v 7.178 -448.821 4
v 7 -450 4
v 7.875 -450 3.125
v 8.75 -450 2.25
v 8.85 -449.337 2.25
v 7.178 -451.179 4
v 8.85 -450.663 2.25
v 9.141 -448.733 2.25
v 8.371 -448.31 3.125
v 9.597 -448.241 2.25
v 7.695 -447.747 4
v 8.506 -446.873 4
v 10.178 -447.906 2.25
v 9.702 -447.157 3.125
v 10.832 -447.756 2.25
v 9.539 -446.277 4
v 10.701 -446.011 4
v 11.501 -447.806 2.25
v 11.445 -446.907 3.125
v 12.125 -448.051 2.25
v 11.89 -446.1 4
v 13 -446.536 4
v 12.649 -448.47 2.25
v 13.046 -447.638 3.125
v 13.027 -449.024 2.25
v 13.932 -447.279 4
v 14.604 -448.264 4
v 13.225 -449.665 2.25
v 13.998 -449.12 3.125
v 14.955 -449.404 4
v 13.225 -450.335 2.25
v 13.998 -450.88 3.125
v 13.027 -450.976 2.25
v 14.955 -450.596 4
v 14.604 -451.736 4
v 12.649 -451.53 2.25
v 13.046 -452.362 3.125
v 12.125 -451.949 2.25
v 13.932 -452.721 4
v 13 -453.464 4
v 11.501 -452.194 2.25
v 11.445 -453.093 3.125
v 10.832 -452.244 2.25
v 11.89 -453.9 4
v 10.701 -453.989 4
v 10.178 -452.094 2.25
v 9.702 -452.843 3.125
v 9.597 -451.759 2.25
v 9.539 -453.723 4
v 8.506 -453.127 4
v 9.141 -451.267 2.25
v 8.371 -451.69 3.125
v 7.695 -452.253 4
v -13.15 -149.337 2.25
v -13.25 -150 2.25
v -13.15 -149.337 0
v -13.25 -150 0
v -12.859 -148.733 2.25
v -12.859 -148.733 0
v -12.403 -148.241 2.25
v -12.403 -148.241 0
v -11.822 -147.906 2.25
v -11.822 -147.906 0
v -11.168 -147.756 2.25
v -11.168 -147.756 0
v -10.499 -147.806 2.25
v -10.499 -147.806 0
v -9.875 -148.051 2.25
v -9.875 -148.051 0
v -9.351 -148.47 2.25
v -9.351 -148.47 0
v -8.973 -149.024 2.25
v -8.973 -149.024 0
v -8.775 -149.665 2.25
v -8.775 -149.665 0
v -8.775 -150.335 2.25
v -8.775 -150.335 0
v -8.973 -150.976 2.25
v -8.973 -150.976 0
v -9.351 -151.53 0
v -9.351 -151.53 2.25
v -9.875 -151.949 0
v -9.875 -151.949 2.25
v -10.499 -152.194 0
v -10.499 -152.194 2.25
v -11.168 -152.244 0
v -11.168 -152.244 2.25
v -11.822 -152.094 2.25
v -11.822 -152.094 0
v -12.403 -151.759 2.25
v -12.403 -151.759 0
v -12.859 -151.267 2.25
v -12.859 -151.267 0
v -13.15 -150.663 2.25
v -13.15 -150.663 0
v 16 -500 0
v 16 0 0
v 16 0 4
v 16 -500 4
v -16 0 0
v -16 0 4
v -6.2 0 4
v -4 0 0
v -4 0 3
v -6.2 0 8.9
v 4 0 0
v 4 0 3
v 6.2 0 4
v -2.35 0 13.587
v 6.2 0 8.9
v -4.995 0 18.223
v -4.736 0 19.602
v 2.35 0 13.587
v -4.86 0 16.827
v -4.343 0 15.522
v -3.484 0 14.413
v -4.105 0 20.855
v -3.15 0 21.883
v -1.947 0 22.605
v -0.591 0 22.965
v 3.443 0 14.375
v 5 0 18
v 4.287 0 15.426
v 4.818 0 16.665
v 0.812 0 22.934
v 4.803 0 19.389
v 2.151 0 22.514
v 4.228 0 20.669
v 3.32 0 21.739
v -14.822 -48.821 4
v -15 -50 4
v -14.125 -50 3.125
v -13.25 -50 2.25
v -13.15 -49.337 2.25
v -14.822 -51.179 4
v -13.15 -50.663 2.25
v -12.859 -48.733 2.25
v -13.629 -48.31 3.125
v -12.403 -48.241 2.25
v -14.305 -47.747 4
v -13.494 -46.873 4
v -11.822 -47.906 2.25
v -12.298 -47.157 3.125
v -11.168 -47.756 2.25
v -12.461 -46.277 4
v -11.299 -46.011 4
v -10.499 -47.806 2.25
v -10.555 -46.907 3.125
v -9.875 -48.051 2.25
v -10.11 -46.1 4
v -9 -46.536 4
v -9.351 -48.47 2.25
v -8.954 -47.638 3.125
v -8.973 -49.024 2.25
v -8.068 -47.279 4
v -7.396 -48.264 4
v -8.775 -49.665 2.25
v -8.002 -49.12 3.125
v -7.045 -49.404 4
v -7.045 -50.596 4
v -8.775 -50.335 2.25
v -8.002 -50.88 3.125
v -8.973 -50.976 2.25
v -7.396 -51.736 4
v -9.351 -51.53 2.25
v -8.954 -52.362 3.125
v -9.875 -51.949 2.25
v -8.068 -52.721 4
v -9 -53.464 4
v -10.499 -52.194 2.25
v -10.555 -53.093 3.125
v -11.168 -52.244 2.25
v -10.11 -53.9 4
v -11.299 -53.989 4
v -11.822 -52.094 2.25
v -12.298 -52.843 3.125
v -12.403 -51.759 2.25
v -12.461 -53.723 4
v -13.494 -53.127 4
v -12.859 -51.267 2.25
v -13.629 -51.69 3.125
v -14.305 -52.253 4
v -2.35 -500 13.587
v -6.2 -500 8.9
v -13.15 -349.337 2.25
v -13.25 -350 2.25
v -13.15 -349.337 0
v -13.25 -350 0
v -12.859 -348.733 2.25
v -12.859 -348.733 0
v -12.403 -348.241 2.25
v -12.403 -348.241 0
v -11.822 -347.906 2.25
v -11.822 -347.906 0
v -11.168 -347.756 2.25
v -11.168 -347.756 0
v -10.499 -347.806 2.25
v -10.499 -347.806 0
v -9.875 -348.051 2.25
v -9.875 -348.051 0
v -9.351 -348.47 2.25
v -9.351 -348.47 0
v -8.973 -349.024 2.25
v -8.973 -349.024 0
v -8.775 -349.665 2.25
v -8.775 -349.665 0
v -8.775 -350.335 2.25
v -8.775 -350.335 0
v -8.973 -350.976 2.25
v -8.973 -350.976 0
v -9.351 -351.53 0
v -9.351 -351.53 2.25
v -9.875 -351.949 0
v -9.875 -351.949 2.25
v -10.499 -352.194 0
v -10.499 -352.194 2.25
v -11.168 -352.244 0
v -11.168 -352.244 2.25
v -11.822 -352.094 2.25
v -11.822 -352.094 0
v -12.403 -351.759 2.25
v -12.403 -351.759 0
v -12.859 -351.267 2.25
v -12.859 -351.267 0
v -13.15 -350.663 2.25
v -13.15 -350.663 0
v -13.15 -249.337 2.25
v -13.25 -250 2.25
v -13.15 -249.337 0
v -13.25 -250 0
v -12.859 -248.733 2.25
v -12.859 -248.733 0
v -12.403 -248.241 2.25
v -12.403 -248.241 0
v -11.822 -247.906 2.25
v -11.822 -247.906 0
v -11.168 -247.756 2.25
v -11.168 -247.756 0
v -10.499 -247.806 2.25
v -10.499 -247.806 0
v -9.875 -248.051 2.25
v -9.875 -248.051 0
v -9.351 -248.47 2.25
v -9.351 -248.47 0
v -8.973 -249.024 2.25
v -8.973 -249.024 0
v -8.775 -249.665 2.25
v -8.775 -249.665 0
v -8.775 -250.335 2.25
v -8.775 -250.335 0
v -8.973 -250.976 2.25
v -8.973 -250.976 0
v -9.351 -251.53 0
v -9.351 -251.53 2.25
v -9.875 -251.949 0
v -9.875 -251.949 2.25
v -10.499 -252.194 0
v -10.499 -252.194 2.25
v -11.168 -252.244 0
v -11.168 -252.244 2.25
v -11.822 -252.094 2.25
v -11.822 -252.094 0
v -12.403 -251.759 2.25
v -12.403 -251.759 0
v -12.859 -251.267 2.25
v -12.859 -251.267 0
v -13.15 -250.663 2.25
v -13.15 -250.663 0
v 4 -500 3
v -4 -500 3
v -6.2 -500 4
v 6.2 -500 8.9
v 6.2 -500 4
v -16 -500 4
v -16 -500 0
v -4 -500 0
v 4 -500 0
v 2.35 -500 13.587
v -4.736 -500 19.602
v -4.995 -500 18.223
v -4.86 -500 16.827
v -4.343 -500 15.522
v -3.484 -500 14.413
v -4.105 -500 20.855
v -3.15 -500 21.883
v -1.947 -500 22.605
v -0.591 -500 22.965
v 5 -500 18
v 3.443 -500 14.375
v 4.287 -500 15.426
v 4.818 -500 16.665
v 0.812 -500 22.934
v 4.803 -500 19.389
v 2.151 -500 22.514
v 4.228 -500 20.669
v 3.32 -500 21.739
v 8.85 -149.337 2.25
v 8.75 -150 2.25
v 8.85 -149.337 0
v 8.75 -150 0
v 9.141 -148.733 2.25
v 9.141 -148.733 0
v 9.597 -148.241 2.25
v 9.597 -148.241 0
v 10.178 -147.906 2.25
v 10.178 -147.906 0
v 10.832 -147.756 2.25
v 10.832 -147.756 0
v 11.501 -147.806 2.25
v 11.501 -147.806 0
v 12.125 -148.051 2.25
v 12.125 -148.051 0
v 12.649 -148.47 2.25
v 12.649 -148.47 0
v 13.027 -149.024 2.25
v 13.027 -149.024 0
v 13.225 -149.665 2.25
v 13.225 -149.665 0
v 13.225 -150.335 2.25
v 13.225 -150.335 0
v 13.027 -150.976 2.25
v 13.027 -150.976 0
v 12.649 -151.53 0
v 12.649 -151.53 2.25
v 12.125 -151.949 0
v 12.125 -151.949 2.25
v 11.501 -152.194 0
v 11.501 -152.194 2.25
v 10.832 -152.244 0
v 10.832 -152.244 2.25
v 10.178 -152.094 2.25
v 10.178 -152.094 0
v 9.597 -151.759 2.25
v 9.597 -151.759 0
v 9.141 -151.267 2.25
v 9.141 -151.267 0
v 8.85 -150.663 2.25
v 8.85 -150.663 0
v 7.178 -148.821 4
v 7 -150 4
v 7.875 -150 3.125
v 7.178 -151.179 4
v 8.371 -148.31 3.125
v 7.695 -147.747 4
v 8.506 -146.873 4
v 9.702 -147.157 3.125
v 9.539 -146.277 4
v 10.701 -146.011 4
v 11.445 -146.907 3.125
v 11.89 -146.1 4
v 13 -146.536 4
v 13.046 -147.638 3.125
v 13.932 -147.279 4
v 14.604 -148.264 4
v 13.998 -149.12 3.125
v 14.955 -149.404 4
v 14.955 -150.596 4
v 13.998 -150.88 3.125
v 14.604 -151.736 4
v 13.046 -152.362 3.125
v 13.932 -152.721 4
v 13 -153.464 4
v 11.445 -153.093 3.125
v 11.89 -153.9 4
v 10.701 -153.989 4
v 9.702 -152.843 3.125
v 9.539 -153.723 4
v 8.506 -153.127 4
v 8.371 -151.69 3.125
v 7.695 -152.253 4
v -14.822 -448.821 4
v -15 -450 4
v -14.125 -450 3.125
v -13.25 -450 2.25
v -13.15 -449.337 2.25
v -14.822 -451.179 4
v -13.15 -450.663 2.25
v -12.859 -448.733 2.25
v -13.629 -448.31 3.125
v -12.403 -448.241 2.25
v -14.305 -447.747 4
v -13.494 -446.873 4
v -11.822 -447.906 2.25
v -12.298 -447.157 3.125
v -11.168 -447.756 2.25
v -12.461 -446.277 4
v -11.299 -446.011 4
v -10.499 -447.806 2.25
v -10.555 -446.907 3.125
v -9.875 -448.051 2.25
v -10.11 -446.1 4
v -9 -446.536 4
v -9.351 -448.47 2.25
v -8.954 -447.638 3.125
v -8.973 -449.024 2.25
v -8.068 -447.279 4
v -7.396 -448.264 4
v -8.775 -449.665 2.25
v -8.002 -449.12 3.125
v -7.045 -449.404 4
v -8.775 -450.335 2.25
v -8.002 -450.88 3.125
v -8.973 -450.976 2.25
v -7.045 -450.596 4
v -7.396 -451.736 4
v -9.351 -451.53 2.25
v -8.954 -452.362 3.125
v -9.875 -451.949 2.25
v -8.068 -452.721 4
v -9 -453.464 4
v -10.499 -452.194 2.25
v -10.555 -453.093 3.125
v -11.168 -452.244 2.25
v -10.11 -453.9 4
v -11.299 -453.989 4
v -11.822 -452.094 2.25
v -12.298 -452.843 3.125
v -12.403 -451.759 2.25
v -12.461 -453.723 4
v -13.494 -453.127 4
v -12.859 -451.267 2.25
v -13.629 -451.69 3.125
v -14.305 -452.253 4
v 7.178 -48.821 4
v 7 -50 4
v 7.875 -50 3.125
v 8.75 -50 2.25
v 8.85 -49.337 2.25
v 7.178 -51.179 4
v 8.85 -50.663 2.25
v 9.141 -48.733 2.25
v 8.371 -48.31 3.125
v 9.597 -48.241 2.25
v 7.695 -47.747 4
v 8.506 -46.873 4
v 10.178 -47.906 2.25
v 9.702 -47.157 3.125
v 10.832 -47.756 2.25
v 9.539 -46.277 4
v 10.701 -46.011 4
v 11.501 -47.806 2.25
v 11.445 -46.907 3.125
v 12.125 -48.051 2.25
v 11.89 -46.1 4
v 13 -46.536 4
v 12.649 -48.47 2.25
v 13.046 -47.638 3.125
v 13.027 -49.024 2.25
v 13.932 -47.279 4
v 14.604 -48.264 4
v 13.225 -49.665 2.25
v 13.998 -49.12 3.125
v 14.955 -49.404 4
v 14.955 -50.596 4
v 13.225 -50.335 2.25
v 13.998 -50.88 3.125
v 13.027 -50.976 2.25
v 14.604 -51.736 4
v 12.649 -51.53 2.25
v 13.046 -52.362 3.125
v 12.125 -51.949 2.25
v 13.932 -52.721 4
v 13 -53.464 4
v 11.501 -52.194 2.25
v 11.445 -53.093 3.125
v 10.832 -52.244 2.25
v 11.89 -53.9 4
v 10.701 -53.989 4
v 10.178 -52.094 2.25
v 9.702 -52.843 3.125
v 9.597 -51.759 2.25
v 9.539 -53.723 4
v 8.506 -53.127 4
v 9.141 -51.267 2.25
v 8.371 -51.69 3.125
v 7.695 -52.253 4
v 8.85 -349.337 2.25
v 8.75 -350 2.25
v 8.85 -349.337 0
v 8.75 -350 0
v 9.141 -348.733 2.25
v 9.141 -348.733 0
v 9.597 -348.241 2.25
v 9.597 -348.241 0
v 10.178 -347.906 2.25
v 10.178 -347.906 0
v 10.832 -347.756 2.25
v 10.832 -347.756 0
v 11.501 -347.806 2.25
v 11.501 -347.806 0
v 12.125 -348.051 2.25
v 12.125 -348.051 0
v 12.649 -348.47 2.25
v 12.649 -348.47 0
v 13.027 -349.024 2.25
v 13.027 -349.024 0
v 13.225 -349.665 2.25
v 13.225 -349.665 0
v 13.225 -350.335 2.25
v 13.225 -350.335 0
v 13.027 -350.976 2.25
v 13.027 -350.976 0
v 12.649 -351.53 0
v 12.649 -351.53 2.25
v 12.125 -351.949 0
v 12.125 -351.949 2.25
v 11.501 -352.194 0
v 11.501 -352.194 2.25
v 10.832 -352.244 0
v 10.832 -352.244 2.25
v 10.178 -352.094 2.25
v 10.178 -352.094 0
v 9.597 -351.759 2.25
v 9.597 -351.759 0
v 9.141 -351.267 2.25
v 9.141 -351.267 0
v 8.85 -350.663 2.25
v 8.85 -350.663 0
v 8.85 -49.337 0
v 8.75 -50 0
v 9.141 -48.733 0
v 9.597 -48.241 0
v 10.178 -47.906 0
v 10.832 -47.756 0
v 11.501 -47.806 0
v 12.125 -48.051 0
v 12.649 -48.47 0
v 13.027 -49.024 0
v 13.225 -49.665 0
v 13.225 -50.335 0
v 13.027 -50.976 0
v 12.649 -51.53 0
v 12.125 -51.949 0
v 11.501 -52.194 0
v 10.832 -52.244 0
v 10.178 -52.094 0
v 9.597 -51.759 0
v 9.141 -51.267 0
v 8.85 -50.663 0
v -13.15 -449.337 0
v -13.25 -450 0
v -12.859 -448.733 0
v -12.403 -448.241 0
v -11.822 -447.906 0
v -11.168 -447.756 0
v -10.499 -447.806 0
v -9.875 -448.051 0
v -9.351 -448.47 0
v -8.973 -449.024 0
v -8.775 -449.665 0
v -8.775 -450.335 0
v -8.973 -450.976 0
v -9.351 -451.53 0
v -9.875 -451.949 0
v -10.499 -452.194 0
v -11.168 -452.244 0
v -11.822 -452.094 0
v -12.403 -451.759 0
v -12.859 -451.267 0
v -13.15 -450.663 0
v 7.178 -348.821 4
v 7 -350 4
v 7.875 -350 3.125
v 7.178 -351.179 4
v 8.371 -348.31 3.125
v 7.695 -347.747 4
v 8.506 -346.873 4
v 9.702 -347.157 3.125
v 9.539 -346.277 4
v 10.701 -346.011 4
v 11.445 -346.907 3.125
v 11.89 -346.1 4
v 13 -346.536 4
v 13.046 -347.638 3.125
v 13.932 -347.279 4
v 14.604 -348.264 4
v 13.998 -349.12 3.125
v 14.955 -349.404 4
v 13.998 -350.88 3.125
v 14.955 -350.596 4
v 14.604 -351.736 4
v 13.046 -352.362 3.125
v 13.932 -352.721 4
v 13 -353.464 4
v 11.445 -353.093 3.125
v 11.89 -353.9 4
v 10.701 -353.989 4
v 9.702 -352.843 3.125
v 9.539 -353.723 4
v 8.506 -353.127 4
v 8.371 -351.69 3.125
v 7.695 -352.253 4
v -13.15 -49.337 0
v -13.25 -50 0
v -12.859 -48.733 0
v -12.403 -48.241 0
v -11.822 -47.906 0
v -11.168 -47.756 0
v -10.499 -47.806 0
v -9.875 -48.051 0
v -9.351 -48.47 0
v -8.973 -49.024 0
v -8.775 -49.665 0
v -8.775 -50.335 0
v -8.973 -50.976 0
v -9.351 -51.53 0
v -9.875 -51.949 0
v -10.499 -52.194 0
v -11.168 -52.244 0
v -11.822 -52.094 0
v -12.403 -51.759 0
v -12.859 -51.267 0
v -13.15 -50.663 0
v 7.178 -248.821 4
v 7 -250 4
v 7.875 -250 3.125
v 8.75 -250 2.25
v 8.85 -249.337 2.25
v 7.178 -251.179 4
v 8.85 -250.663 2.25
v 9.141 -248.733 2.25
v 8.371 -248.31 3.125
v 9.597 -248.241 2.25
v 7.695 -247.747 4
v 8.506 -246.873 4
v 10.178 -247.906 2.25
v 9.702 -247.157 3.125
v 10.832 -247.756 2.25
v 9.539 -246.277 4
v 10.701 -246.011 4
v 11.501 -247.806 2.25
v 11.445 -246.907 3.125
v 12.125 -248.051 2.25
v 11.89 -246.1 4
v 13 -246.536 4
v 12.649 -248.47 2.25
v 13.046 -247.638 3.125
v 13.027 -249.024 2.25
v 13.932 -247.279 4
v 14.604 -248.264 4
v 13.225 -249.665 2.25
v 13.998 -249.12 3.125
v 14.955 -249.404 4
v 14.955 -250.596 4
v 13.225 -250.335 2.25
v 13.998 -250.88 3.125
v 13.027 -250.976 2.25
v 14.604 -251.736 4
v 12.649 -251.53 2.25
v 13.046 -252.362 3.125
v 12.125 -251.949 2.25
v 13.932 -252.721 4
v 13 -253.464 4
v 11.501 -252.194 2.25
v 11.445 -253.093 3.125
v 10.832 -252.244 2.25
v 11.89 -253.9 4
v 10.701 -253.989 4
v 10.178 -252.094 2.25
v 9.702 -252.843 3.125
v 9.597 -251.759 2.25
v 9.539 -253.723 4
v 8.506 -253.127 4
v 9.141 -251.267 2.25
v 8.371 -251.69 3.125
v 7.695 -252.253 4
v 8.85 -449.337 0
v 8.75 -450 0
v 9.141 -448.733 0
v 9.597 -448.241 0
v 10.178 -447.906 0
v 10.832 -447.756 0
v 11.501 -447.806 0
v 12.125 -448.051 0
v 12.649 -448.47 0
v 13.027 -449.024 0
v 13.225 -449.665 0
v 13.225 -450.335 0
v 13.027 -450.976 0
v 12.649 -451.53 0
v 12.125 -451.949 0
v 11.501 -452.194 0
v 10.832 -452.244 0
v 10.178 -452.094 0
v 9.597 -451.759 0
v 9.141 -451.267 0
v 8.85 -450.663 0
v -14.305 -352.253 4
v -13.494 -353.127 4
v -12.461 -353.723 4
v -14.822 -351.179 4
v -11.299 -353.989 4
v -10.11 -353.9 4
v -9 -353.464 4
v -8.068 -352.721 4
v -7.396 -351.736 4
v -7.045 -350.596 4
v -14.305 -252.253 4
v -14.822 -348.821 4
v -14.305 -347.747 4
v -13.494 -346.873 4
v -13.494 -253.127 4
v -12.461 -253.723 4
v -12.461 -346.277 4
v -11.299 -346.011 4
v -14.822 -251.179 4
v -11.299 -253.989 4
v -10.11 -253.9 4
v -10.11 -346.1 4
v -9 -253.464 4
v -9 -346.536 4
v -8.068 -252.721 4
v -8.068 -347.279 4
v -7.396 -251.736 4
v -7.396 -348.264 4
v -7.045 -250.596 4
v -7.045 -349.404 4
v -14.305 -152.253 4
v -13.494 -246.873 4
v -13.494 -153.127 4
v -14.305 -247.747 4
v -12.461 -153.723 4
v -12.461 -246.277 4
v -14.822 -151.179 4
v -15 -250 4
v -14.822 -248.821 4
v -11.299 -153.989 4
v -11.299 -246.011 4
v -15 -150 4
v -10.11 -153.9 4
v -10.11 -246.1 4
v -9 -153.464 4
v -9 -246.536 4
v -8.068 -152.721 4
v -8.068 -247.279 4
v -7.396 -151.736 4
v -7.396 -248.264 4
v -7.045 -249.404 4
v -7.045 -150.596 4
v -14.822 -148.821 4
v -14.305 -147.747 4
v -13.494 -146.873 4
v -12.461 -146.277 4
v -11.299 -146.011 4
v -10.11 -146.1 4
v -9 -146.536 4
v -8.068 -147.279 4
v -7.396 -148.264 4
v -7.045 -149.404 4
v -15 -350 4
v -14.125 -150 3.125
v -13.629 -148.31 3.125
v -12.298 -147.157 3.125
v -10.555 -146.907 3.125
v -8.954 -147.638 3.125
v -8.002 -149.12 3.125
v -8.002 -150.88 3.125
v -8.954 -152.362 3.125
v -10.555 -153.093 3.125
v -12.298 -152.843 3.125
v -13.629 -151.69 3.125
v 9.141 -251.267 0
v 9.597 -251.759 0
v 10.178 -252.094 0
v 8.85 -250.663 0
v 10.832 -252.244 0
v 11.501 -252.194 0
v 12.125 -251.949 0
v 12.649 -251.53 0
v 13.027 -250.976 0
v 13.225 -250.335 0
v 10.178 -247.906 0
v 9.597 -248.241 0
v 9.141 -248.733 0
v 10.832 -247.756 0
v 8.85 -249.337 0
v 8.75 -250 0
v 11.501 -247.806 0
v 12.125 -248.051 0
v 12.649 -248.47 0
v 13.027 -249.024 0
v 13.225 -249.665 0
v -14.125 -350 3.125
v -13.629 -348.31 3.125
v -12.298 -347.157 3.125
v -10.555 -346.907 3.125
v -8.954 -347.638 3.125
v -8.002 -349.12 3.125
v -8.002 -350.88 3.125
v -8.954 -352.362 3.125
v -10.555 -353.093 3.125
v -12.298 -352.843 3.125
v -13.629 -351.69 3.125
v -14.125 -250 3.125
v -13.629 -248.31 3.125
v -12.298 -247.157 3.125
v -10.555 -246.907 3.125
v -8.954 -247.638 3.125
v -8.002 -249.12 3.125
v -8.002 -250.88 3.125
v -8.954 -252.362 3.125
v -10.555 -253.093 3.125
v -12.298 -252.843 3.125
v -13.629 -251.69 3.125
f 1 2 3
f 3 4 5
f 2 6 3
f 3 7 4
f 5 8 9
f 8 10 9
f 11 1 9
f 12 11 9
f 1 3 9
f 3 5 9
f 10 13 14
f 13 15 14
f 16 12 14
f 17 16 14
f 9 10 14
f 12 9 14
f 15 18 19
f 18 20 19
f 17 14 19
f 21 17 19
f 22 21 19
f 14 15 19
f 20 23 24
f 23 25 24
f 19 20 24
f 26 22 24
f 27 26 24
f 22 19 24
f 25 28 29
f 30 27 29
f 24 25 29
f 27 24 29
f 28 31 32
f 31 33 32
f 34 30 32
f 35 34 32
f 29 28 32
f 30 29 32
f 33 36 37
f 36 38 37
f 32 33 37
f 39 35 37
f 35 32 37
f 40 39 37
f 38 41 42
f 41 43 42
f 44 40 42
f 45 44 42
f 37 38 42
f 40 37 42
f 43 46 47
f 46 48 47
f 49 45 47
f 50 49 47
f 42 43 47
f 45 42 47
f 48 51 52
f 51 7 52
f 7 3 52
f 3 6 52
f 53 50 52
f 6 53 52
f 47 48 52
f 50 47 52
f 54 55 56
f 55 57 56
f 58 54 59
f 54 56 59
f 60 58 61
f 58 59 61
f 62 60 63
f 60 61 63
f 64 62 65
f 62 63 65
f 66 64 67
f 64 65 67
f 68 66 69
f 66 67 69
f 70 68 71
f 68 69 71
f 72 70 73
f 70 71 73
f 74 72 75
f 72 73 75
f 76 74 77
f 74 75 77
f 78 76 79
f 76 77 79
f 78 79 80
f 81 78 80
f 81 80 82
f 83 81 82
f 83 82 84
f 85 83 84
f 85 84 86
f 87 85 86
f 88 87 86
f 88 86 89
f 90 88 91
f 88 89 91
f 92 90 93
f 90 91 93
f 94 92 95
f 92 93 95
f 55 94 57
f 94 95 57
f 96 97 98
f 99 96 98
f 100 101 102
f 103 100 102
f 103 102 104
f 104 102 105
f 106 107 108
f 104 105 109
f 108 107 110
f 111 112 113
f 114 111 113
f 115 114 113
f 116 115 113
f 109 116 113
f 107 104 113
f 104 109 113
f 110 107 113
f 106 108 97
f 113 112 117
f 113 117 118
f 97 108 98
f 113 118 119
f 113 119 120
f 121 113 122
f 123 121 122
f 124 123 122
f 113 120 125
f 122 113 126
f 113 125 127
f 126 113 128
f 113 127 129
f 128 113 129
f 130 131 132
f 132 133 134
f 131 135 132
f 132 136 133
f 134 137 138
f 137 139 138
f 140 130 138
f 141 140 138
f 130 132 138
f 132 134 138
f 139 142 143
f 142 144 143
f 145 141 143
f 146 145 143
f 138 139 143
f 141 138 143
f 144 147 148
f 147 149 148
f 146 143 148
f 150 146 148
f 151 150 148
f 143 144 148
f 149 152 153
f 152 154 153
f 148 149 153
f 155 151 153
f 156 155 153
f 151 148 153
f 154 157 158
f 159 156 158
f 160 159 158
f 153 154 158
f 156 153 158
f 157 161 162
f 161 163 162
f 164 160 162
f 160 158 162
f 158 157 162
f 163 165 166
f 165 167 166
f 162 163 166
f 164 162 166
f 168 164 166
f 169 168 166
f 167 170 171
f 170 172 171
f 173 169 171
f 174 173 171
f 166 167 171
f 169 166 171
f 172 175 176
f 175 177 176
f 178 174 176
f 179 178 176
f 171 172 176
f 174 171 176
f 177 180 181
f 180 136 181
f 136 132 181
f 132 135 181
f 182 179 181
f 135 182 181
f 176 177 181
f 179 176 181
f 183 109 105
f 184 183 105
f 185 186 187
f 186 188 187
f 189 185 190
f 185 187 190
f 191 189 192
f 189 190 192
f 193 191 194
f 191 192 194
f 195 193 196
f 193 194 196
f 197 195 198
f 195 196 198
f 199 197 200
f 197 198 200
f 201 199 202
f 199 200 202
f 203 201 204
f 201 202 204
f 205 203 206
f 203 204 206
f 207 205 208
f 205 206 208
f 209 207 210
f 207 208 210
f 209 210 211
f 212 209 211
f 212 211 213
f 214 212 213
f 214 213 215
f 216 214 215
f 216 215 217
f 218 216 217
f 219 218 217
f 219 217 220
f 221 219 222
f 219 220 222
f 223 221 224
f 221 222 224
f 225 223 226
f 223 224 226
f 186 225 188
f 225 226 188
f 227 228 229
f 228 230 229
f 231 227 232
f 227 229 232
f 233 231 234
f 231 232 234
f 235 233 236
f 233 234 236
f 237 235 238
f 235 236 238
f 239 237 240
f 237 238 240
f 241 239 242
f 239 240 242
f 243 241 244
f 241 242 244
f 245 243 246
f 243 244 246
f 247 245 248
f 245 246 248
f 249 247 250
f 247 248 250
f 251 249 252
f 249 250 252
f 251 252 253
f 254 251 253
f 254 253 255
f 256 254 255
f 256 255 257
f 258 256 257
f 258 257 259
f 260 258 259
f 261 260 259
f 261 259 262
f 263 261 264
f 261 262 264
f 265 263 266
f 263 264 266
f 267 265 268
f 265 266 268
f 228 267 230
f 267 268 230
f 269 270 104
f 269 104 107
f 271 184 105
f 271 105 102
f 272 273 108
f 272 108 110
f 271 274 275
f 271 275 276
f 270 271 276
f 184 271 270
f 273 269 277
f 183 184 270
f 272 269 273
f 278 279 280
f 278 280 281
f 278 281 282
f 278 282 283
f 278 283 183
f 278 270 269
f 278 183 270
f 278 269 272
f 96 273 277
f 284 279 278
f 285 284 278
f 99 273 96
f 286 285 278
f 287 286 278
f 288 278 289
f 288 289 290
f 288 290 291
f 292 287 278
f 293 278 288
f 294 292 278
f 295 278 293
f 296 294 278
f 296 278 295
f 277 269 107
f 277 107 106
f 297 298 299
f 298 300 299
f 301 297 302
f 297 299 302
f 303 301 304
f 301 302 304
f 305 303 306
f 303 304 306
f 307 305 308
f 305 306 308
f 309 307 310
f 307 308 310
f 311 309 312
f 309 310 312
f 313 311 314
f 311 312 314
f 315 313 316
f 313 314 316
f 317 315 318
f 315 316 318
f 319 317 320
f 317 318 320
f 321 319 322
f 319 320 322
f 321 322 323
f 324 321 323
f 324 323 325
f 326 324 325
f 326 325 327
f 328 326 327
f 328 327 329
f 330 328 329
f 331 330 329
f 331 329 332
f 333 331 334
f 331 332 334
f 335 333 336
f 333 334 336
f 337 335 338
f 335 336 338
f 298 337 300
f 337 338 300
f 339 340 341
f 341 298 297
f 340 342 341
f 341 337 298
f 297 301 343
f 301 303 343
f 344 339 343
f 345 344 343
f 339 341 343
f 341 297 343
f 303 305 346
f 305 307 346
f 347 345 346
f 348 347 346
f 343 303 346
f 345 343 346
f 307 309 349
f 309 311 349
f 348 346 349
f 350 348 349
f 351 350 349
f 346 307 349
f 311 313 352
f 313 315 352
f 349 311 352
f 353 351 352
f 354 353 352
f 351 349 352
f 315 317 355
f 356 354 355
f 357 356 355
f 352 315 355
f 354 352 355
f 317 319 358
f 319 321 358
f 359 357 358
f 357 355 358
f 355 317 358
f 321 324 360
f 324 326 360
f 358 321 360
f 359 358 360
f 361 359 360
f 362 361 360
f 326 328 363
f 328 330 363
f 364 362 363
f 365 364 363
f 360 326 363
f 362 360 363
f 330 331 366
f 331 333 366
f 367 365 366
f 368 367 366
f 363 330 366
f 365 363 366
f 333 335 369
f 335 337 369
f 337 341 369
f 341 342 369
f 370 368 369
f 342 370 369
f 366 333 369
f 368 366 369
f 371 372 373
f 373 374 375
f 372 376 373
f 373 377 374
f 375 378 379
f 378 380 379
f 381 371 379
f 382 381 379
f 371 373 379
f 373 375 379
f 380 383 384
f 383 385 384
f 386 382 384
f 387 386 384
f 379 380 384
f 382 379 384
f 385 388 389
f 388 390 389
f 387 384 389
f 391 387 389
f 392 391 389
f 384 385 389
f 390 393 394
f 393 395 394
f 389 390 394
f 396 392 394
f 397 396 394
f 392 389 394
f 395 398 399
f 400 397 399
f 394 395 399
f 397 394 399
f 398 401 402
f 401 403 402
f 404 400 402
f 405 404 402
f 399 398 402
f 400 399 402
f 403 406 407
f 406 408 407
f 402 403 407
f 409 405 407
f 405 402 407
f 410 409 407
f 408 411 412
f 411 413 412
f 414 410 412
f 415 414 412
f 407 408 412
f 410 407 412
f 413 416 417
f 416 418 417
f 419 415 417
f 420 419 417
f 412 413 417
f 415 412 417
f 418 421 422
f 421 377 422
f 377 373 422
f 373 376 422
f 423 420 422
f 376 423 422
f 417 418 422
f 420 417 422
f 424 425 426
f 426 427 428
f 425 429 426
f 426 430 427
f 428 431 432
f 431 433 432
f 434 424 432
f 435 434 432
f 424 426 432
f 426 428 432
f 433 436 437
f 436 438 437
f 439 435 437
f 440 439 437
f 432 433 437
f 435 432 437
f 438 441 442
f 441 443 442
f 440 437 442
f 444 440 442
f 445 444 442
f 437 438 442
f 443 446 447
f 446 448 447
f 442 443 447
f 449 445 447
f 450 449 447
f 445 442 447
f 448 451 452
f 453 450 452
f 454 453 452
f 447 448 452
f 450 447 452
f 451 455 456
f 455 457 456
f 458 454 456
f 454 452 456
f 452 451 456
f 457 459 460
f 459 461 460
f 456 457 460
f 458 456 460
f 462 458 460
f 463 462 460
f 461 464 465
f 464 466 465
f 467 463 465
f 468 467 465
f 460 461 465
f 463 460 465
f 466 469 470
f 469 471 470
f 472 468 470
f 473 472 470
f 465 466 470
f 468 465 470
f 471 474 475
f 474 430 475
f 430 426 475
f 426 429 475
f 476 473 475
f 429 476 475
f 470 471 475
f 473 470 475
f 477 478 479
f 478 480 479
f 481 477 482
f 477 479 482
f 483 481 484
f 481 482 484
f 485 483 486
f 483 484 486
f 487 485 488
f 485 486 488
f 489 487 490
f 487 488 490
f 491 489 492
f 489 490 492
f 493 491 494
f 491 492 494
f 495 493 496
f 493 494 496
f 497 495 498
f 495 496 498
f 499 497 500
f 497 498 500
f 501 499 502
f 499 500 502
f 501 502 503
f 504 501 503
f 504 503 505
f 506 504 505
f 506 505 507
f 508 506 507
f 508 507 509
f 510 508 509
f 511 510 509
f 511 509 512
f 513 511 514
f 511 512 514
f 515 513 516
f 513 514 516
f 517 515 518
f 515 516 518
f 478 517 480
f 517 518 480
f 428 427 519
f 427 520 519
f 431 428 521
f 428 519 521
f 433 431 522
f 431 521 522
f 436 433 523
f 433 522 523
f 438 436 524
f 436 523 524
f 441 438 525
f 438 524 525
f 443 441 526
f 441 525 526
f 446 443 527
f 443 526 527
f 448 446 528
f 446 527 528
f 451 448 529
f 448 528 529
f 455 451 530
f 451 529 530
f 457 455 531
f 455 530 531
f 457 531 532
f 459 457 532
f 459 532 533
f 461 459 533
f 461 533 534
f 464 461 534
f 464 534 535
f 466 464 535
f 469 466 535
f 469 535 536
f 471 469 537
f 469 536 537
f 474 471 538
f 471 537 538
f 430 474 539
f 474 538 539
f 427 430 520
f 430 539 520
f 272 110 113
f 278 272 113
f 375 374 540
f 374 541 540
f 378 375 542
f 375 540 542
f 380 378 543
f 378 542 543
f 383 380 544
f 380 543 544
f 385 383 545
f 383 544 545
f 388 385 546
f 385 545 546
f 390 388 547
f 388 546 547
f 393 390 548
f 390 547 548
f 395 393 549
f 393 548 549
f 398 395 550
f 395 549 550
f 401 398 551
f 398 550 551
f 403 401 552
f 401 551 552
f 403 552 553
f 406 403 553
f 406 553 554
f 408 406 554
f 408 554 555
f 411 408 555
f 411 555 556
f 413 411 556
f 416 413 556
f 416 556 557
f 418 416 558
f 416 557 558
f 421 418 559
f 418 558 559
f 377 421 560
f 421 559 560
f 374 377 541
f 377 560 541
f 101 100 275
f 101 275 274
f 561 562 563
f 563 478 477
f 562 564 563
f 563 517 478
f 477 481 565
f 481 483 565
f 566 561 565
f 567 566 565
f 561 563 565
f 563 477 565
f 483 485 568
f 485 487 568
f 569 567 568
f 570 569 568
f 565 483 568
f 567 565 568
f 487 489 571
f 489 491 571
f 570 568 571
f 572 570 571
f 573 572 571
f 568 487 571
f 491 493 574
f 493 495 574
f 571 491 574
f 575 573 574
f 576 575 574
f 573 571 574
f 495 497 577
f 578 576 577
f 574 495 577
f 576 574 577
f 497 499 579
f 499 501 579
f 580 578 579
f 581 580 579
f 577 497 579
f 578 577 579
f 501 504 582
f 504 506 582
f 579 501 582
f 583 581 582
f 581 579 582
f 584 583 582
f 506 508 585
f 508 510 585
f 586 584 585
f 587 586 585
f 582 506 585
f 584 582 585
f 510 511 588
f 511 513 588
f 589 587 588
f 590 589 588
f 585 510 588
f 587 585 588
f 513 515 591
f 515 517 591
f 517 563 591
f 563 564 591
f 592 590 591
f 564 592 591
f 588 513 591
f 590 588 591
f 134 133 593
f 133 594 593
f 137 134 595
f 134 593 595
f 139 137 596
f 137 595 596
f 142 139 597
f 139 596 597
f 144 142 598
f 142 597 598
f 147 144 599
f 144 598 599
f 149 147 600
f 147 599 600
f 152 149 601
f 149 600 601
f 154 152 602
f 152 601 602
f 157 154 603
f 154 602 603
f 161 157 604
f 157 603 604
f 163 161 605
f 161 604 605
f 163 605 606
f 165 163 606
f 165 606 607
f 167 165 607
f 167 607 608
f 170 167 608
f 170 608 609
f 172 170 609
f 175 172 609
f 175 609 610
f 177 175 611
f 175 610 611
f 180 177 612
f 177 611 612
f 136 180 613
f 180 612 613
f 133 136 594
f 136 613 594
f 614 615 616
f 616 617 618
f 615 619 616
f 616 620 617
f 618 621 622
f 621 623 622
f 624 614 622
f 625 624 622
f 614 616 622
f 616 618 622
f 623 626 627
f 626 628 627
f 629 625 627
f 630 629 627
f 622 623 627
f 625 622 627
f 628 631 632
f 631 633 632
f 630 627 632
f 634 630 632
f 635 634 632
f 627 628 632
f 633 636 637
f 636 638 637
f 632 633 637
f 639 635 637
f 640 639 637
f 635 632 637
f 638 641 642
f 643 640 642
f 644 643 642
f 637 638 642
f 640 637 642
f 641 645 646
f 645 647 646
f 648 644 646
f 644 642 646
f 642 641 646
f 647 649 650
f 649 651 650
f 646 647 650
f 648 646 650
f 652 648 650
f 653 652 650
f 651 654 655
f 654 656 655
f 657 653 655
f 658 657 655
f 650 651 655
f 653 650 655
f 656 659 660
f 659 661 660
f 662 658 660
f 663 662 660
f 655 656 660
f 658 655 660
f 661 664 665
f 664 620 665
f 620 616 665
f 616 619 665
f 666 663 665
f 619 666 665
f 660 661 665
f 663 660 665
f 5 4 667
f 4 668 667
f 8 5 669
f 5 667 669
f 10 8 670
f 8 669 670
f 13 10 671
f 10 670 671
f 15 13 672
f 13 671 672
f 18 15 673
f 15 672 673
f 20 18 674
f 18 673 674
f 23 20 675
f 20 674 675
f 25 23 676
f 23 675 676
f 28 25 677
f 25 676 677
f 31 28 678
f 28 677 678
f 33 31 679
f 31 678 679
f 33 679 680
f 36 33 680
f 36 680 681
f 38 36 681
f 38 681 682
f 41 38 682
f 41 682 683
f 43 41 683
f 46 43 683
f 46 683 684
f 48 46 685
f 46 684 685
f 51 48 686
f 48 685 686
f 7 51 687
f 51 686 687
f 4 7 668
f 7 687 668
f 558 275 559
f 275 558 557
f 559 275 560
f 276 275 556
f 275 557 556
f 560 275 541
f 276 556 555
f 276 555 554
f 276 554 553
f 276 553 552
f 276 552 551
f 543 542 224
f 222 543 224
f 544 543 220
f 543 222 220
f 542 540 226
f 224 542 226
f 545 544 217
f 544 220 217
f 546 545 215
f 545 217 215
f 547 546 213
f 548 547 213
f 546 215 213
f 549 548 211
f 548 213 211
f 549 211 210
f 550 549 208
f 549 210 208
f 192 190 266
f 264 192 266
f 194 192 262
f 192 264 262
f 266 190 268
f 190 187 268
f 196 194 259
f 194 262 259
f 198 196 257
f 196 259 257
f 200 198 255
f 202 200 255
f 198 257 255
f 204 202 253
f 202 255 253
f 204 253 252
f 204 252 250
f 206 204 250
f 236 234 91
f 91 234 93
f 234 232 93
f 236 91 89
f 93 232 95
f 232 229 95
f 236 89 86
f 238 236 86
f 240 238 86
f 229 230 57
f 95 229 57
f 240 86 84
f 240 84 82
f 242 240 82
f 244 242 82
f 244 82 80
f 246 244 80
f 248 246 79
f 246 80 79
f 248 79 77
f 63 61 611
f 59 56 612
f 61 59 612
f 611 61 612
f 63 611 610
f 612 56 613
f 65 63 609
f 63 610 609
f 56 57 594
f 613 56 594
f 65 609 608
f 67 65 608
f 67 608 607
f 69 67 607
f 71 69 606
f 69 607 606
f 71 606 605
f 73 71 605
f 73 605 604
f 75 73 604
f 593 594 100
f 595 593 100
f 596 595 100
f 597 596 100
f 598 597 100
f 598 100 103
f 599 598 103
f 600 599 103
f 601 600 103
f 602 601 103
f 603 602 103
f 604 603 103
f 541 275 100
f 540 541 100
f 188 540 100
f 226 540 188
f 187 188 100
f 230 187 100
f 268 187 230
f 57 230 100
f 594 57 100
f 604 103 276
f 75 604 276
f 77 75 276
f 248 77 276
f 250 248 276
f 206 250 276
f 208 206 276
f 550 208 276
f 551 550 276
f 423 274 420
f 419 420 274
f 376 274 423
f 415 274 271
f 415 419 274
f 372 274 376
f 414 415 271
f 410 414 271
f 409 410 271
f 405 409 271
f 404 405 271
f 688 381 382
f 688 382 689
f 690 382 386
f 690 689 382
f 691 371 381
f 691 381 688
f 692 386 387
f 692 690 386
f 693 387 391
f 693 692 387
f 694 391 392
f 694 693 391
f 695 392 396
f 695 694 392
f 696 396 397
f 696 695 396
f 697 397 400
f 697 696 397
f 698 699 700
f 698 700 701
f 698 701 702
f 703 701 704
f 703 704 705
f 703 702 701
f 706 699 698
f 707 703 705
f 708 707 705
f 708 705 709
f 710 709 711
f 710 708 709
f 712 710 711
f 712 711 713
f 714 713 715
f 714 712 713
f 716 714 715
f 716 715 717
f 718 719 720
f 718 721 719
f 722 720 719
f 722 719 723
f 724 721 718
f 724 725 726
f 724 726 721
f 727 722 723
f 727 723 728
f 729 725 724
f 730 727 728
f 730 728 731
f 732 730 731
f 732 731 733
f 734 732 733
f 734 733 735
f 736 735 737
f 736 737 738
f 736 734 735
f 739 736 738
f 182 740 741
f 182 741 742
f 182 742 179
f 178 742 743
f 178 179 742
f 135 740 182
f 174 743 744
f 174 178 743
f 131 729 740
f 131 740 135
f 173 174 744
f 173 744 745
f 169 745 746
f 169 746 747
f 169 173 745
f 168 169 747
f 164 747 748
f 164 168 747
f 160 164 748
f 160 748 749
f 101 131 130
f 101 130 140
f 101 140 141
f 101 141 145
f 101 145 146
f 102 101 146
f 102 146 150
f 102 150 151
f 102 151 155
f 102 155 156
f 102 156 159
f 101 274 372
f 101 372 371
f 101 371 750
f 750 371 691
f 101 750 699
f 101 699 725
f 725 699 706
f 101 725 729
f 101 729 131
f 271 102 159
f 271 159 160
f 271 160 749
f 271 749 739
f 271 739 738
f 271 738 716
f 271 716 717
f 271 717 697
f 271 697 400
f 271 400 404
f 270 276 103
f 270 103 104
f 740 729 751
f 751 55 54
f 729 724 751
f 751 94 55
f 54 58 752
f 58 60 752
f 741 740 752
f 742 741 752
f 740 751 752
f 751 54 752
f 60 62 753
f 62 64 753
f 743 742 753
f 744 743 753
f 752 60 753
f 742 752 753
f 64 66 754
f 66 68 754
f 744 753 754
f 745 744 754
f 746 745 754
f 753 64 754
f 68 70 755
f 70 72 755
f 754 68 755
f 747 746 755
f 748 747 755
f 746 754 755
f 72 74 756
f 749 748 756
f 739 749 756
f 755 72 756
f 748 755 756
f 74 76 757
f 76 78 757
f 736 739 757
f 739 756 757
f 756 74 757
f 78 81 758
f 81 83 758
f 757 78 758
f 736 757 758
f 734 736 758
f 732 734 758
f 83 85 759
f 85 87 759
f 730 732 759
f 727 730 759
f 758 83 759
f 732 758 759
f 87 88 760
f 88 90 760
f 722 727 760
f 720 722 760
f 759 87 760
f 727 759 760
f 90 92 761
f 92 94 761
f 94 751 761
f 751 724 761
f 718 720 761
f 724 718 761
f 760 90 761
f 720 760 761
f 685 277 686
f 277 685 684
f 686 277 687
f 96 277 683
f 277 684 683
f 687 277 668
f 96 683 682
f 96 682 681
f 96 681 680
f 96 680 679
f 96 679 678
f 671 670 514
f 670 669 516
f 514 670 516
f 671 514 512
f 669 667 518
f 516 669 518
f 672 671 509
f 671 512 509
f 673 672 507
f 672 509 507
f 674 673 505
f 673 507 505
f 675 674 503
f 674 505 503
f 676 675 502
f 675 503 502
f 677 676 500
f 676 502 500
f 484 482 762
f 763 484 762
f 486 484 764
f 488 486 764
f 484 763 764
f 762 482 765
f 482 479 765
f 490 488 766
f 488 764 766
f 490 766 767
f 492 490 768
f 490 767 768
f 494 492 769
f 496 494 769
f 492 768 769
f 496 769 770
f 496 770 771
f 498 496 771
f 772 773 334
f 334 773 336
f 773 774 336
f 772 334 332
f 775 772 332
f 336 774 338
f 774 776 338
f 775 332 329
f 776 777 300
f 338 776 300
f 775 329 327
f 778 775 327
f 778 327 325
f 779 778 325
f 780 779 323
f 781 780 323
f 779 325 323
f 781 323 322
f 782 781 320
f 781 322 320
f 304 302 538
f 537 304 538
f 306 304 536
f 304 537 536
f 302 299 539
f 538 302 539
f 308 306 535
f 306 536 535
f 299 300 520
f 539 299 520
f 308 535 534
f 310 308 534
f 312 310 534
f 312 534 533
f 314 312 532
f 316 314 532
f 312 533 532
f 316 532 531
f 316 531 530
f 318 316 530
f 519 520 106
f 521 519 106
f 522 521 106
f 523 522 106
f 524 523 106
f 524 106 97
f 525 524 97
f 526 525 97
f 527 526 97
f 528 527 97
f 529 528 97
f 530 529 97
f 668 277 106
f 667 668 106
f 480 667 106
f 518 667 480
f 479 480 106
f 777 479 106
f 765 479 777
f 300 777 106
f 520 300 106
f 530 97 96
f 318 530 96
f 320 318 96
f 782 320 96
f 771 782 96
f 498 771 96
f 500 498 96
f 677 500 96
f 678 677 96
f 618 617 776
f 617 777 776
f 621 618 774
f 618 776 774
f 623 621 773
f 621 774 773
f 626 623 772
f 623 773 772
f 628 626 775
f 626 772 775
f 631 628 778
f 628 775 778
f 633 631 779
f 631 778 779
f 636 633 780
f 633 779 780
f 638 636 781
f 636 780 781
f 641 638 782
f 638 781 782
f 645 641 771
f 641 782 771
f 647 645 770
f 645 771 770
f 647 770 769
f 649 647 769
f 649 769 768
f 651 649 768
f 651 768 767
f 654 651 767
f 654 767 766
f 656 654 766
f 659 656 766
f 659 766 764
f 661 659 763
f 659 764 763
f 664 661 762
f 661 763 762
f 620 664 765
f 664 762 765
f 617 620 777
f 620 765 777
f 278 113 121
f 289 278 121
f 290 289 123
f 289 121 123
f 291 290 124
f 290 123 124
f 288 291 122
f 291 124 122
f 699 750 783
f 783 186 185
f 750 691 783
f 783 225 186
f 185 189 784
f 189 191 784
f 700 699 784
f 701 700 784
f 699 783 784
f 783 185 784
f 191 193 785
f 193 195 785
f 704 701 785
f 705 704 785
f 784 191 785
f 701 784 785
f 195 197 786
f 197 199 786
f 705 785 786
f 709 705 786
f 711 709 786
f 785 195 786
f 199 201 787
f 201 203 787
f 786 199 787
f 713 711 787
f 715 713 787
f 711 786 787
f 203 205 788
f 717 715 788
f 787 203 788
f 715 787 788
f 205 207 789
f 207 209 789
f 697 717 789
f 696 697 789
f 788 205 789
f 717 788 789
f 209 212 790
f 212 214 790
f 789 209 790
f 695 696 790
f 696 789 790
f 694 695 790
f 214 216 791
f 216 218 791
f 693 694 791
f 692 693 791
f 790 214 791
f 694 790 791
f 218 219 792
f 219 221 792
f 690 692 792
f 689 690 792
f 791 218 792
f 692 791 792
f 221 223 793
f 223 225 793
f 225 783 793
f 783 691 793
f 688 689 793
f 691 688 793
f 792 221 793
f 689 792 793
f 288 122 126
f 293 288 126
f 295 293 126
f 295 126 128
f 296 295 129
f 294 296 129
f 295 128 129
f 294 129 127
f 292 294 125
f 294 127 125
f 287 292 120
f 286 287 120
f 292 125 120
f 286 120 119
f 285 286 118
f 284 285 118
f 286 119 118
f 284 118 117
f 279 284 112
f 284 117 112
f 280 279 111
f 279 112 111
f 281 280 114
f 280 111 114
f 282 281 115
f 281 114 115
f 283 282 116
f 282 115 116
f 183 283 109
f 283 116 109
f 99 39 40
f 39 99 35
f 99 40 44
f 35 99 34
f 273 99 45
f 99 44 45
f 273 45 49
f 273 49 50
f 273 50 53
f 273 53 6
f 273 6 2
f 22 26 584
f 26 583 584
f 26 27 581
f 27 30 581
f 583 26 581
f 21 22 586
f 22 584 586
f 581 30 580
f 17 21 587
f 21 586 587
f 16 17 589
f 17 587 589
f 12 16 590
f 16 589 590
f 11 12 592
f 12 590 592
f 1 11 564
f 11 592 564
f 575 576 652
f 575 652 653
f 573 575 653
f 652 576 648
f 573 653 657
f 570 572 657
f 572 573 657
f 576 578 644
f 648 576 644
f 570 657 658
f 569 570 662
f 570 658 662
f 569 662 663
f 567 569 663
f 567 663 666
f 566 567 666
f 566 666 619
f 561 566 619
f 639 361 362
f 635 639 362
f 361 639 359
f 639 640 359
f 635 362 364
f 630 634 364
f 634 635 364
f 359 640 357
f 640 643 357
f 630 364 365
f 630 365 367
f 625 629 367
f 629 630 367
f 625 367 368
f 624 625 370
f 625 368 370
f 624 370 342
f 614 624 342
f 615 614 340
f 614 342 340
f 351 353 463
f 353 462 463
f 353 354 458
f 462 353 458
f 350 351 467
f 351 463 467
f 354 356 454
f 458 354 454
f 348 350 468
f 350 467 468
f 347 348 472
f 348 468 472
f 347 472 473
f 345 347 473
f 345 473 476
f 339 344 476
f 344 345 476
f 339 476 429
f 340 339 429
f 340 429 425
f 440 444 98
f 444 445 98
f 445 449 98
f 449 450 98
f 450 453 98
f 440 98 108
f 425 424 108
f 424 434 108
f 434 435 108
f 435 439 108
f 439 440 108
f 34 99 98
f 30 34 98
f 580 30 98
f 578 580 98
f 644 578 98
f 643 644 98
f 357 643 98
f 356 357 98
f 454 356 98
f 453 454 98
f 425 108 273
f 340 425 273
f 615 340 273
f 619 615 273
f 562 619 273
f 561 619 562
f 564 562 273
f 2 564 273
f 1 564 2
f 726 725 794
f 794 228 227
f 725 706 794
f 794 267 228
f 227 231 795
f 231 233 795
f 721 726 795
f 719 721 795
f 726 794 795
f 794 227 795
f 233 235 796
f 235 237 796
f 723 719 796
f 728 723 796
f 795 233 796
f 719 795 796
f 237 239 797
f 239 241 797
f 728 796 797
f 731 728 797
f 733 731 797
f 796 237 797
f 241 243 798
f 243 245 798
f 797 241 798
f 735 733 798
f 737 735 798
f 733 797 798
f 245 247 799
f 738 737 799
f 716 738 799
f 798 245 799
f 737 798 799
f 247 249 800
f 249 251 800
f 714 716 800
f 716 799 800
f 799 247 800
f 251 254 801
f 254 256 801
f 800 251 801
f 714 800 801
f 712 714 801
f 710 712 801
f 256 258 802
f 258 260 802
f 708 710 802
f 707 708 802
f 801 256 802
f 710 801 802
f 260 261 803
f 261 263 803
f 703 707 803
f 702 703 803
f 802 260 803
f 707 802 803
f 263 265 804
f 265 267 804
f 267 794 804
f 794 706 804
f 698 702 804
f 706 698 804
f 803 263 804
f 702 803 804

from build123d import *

# Parameters (mm, degrees)
F1_W           = 9.8
F1_H           = 4
F1_W_2         = 12.4
F1_H_2         = 4.9
F3_DEPTH       = 500
F5_D           = 4.5
F5_CSINK_D     = 8
F5_CSINK_ANGLE = 90


with BuildPart() as f3:
    # F1 (on Front) → F3 (new body, through all)
    with BuildSketch(Plane.XZ):
        with Locations((11.1, 2)):
            Rectangle(F1_W, F1_H)
        Polygon((-6.2, 4), (-6.2, 0), (-4, 0), (-4, 3), (4, 3), (4, 0), (6.2, 0), (6.2, 4), align=None)
        with Locations((0, 6.45)):
            Rectangle(F1_W_2, F1_H_2)
        with BuildLine():
            ThreePointArc((5, 18), (-2.5739075352, 22.2866070499), (-2.35, 13.5866679255))
            ThreePointArc((-2.35, 13.5866679255), (0, 13), (2.35, 13.5866679255))
            ThreePointArc((2.35, 13.5866679255), (4.2866070499, 15.4260924648), (5, 18))
        make_face()
        with Locations((-11.1, 2)):
            Rectangle(F1_W, F1_H)
        with BuildLine():
            Line((-2.35, 13.5866679255), (-6.2, 8.9))
            Line((-6.2, 8.9), (6.2, 8.9))
            Line((6.2, 8.9), (2.35, 13.5866679255))
            ThreePointArc((2.35, 13.5866679255), (0, 13), (-2.35, 13.5866679255))
        make_face()
    extrude(amount=F3_DEPTH)

    # F5 (through all)
    with Locations(Plane.XY.offset(4)):
        with Locations((11, -50), (-11, -50), (-11, -150), (11, -150), (11, -250), (-11, -250), (11, -350), (-11, -350), (11, -450), (-11, -450)):
            CounterSinkHole(F5_D / 2, F5_CSINK_D / 2, counter_sink_angle=F5_CSINK_ANGLE)


with BuildPart() as f6_1:
    # F6: copy of F3
    add(f3.part)


solid = f3.part
